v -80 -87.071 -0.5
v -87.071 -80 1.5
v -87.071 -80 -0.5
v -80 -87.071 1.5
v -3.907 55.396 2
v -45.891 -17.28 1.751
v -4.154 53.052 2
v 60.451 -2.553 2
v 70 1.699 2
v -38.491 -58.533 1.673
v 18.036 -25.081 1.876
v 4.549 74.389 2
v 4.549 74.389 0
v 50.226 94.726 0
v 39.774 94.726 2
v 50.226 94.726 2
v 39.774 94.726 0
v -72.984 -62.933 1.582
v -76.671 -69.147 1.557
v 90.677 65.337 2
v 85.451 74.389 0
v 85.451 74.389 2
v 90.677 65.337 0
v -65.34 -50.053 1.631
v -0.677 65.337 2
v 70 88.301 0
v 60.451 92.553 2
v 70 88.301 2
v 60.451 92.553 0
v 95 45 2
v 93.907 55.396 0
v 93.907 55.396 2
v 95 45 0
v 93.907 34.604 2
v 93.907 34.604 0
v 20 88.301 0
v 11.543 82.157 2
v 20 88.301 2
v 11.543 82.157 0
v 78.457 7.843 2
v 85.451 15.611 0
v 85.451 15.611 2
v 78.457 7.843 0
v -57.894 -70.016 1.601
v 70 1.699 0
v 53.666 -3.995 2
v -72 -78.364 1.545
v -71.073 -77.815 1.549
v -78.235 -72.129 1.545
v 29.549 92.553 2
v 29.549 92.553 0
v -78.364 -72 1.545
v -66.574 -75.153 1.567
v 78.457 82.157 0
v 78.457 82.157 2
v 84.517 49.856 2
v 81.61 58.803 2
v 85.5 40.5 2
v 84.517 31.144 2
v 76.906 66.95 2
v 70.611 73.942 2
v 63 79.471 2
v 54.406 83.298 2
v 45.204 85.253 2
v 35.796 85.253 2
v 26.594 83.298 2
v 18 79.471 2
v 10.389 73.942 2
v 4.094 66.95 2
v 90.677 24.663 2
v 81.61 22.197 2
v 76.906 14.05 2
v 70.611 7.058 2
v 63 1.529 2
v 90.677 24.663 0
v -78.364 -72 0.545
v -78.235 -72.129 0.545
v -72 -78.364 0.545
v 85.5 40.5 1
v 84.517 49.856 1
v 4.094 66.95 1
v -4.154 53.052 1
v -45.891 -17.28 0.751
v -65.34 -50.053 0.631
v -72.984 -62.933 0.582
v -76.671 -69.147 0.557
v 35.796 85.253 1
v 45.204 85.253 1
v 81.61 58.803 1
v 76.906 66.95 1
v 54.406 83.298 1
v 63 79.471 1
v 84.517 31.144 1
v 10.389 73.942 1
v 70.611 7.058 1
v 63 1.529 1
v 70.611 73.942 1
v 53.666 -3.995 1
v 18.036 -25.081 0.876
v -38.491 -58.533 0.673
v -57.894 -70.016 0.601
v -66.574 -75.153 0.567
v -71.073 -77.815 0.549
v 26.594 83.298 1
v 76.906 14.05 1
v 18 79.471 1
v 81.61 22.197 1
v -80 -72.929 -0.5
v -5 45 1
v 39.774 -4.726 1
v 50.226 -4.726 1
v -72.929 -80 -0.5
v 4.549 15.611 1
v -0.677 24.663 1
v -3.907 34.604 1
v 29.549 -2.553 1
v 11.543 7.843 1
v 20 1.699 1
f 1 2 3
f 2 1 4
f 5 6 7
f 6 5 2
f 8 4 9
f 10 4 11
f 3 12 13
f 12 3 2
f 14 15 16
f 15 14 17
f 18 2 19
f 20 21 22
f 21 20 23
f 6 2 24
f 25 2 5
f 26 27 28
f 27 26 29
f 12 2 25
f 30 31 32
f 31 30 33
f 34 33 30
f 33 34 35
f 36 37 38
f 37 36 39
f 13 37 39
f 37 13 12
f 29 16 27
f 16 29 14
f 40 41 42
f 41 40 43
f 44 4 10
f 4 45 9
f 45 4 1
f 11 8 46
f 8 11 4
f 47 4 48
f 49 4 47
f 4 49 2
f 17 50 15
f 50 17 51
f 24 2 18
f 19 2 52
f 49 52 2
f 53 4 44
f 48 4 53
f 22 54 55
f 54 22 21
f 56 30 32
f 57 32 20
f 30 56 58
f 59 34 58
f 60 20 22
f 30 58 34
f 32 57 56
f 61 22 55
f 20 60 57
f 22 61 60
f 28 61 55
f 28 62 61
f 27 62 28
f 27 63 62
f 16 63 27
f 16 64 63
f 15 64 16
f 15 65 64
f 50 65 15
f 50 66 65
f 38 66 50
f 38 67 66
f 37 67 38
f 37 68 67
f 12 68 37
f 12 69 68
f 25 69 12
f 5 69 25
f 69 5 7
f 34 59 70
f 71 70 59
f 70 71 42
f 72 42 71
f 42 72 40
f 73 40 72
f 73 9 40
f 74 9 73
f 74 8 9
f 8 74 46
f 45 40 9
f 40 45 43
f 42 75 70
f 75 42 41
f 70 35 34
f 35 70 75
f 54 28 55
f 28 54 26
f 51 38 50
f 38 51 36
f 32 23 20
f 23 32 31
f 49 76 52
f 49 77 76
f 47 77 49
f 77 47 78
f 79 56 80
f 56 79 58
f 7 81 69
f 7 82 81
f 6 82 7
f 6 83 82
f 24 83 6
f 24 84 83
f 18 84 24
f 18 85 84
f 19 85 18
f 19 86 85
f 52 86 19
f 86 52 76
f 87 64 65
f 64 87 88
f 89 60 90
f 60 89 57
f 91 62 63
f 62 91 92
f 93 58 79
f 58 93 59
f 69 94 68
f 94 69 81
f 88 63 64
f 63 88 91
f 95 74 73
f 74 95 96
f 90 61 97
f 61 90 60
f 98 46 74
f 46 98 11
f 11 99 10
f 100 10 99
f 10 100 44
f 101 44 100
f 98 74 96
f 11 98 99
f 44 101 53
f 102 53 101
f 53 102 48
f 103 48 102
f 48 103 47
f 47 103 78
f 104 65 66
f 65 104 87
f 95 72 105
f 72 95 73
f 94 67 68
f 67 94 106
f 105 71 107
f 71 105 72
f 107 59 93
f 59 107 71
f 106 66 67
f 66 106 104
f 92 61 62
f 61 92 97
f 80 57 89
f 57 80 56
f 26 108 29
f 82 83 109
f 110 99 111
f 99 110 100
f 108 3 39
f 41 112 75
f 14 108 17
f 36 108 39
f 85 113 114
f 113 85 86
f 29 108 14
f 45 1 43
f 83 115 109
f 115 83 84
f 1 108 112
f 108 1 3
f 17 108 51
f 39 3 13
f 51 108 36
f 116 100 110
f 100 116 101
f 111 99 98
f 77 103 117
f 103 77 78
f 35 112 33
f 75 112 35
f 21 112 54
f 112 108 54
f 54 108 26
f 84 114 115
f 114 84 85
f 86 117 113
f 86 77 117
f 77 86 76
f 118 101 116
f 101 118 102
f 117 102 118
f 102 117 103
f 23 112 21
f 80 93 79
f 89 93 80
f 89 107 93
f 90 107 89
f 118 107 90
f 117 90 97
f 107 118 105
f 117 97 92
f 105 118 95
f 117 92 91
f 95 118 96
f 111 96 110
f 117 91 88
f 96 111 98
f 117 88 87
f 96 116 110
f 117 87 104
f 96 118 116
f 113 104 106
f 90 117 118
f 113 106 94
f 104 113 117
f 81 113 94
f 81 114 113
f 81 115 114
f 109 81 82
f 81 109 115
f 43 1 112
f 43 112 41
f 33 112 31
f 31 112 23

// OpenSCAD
bellowPlate();
translate([0,0,1]) difference() {
	bellowPlate();
	scale([0.9,.9,1.1]) bellowPlate();
}



%cube([200, 200, .1], center = true);

module bellowPlate()
{
	hull()
	{
		translate([45,45,0]) cylinder(r=50, h=1);
		translate([-80,-80,0]) rotate([0,0,45]) cube([10, 10, 1], center = true);
	}
}
